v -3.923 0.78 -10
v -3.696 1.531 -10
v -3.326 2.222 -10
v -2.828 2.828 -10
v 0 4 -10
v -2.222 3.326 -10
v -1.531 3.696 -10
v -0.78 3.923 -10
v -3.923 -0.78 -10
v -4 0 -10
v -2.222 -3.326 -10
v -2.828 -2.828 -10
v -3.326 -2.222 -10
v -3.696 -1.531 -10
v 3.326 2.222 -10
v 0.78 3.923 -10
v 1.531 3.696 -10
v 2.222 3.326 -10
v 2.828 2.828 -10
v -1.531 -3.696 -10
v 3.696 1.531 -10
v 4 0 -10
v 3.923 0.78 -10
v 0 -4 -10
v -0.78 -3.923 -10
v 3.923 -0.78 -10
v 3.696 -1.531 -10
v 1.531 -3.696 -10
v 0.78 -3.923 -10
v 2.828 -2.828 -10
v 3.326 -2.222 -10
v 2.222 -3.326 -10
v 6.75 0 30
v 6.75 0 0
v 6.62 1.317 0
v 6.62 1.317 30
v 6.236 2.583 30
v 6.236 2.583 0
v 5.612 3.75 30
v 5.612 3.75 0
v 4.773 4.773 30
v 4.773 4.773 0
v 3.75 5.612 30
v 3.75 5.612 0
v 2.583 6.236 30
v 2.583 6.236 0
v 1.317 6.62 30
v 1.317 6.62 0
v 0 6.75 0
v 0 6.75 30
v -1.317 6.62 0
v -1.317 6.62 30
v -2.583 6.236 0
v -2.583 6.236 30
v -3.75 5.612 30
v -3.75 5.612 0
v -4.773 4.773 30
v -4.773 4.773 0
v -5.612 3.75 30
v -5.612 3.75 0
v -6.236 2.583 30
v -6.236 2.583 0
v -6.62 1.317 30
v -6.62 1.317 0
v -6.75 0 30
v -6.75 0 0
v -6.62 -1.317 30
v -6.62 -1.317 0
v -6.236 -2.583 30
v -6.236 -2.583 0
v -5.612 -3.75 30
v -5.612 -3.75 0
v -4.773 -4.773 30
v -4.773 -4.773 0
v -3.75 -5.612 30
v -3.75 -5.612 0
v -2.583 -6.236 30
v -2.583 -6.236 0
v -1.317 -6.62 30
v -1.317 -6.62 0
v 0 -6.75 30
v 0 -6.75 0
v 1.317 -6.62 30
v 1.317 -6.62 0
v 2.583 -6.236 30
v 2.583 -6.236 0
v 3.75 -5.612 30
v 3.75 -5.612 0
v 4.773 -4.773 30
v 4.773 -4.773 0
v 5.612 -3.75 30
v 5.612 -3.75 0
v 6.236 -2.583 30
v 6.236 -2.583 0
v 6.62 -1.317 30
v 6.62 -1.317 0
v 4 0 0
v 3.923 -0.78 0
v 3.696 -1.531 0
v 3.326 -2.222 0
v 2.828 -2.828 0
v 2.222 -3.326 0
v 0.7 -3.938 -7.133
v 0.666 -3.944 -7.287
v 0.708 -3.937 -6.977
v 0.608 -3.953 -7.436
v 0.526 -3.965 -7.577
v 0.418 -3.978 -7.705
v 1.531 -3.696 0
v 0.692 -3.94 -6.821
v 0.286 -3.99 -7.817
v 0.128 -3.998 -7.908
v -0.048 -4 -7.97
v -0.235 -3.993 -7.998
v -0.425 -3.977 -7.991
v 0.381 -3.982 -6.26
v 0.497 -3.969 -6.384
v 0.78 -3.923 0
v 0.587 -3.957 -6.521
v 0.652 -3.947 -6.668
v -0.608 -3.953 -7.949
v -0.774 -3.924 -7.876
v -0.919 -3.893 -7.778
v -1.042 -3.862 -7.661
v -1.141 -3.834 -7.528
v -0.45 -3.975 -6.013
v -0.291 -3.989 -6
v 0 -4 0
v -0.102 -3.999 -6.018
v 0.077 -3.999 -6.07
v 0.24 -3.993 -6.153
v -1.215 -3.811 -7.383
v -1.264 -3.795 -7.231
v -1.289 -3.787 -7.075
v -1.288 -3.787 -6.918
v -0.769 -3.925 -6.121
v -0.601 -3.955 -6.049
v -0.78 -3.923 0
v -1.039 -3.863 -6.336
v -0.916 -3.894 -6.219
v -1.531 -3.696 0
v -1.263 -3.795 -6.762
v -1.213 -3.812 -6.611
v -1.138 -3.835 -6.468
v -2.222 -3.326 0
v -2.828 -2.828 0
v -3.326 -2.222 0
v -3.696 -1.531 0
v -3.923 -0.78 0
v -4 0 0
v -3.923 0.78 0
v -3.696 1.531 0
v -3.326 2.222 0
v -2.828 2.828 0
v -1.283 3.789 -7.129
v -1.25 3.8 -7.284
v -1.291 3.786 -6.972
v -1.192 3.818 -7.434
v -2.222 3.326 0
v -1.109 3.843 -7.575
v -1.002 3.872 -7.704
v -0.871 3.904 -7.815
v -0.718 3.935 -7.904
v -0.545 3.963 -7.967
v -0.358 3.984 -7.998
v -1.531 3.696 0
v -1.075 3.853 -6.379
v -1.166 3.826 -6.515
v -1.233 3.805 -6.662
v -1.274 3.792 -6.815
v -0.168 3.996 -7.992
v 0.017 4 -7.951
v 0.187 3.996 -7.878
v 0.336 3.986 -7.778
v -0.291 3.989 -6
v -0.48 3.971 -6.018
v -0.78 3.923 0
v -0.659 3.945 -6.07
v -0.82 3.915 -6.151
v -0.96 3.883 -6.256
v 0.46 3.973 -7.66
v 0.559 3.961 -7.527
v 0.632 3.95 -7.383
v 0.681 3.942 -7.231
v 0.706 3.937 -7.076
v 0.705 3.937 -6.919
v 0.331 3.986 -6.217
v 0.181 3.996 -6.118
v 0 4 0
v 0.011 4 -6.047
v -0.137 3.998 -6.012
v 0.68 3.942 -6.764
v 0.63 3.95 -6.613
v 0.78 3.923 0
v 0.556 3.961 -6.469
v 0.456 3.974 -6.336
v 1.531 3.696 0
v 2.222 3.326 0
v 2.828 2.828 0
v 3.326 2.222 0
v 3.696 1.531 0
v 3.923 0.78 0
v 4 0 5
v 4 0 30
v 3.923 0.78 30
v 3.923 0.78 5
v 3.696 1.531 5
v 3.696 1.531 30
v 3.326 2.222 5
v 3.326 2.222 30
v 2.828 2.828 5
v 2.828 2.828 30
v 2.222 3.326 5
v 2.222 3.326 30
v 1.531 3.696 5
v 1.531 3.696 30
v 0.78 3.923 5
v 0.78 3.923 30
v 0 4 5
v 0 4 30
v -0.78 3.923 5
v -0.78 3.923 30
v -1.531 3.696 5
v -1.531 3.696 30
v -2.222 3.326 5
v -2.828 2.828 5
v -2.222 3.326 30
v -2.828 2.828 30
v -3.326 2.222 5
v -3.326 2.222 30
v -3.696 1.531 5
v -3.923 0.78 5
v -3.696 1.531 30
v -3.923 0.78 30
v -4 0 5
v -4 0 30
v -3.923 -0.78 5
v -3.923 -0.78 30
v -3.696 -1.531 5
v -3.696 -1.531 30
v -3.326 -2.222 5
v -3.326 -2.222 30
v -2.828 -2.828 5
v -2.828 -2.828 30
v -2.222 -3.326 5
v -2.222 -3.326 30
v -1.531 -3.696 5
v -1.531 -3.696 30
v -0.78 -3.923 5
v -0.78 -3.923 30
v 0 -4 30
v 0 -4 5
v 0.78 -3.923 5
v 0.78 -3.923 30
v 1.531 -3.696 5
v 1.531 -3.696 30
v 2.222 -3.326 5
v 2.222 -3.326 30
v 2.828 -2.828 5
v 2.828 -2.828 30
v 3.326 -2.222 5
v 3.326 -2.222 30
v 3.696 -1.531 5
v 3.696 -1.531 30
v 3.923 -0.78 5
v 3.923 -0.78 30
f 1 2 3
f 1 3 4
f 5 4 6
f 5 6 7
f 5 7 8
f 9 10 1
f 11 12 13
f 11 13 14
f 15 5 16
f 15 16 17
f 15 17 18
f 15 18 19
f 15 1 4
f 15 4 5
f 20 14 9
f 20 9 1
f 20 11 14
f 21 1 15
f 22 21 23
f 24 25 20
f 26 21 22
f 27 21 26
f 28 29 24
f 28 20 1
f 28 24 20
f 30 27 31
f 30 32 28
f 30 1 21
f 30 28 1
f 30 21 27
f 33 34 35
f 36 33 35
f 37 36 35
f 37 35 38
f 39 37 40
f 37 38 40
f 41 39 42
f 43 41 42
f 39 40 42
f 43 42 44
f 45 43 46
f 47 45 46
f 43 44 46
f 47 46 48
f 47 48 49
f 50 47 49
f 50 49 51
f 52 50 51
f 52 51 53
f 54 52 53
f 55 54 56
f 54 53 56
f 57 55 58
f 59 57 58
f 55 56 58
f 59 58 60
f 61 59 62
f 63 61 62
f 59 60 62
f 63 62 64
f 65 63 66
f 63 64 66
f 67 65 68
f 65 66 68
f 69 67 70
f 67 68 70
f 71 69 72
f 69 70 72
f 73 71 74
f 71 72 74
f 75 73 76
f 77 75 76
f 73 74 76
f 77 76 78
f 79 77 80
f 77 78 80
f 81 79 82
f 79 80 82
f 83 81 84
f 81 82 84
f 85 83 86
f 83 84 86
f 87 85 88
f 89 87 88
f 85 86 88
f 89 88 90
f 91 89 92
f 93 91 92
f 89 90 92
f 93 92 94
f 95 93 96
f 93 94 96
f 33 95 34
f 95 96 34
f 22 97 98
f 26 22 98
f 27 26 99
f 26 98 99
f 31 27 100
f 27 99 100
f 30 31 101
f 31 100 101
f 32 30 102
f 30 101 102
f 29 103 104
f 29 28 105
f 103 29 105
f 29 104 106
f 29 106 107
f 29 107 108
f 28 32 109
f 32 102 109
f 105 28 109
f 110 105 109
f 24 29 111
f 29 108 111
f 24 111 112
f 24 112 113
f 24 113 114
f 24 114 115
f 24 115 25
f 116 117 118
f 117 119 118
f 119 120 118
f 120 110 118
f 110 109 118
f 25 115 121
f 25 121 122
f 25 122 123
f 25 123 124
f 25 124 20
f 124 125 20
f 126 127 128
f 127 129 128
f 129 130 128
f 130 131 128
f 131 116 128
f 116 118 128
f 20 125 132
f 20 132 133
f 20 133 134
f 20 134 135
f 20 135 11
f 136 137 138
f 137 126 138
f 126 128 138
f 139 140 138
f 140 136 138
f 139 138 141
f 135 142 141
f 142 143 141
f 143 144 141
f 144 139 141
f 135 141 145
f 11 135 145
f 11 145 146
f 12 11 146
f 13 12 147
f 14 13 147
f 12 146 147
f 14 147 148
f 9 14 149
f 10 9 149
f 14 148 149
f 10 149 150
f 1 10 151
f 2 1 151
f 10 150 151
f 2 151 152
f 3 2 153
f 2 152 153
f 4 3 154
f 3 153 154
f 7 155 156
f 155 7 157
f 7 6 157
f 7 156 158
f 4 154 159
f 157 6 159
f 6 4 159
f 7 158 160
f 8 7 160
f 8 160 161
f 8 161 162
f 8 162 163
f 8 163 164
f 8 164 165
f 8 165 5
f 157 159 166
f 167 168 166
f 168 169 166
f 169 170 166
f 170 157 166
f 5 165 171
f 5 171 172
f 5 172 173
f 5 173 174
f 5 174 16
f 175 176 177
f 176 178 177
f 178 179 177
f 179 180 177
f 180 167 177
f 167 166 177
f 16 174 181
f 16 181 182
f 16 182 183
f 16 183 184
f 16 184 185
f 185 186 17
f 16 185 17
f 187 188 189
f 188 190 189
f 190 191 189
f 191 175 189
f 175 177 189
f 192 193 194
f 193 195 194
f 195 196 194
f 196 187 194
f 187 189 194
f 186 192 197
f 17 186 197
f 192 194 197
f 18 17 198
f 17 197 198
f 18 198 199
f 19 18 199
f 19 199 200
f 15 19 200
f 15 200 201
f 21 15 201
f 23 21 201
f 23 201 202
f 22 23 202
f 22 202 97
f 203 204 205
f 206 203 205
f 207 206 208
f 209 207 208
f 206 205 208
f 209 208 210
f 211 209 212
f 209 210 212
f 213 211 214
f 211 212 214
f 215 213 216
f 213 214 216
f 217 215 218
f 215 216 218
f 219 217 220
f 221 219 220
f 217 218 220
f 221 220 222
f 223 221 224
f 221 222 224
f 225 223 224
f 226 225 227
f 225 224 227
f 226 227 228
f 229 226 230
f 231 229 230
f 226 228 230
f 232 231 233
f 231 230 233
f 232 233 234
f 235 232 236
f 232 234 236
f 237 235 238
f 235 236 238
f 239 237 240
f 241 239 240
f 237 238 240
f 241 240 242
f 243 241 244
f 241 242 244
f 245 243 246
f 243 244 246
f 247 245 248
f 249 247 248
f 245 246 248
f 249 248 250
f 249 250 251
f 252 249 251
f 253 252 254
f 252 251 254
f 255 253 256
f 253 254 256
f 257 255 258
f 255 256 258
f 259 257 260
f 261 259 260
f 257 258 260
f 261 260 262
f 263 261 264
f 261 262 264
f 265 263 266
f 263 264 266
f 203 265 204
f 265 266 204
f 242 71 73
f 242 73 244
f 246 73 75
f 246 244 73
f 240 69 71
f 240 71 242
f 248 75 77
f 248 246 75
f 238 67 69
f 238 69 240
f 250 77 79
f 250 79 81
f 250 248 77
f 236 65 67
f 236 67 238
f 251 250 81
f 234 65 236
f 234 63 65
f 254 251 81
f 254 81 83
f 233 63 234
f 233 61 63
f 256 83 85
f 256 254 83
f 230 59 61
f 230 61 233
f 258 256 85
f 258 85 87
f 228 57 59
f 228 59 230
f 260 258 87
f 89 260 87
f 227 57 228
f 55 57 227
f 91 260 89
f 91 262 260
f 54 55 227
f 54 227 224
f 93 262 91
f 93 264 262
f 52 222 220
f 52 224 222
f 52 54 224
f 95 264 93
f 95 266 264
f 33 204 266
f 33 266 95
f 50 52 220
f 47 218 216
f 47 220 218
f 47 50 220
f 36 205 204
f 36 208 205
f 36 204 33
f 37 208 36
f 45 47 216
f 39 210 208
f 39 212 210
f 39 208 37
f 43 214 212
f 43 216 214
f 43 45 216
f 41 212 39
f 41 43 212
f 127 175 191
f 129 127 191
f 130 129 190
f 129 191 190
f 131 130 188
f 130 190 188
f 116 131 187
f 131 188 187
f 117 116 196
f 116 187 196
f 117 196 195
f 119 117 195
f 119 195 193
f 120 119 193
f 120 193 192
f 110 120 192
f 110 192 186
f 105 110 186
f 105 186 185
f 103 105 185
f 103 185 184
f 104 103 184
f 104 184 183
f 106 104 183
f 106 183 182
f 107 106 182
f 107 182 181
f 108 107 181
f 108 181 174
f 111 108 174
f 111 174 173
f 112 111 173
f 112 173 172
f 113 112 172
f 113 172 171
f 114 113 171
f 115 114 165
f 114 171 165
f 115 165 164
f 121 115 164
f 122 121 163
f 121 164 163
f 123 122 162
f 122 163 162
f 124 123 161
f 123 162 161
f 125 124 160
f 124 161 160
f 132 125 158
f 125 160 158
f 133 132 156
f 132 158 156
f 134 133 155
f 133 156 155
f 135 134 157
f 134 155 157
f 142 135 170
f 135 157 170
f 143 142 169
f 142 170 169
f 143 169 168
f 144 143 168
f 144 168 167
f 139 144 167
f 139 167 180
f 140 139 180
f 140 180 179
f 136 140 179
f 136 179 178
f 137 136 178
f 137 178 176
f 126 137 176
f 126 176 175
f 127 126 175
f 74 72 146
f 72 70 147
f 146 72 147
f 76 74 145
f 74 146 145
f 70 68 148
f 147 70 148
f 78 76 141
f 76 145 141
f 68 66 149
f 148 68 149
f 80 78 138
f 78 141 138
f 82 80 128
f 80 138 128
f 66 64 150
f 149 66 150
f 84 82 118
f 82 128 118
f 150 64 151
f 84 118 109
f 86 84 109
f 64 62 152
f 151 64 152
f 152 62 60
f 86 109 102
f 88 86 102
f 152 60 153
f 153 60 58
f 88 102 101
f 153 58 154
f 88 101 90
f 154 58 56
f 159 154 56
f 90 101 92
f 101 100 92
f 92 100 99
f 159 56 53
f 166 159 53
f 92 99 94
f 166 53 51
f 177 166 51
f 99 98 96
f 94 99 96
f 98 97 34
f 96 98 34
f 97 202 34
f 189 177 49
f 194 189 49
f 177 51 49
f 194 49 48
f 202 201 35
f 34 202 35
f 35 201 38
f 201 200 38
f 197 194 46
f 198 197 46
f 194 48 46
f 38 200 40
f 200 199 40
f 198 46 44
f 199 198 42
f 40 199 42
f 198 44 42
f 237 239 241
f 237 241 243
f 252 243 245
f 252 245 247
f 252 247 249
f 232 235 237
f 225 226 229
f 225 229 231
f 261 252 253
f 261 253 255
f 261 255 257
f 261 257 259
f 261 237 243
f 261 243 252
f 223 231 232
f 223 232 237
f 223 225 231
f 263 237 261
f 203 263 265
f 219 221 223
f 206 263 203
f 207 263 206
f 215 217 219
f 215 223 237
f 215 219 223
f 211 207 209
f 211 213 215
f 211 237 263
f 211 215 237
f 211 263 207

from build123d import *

# Parameters (mm, degrees)
SKETCH1_R           = 6.75
BOSS_EXTRUDE1_DEPTH = 30
SKETCH3_R           = 4
BOSS_EXTRUDE4_DEPTH = 10
SKETCH4_R           = 1
CUT_EXTRUDE2_DEPTH  = 15
SKETCH2_R           = 4
CUT_EXTRUDE3_DEPTH  = 25


with BuildPart() as part:
    # Sketch1 → Boss-Extrude1 (new body)
    with BuildSketch(Plane.XY):
        Circle(SKETCH1_R)
    extrude(amount=BOSS_EXTRUDE1_DEPTH)

    # Sketch3 → Boss-Extrude4 (add)
    with BuildSketch(Plane(origin=(0, 0, 0), x_dir=(-1, 0, 0), z_dir=(0, 0, -1))):
        with Locations(Location((0, 0, 0), (0, 0, 180))):
            Circle(SKETCH3_R)
    extrude(amount=BOSS_EXTRUDE4_DEPTH)

    # Sketch4 → Cut-Extrude2 (cut)
    with BuildSketch(Plane(origin=(0, 4, 0), x_dir=(1, 0, 0), z_dir=(0, 1, 0))):
        with Locations(Location((-0.291407977, 7, 0), (0, 0, 270))):
            Circle(SKETCH4_R)
    extrude(amount=-CUT_EXTRUDE2_DEPTH, mode=Mode.SUBTRACT)

    # Sketch2 → Cut-Extrude3 (cut)
    with BuildSketch(Plane.XY.offset(30)):
        Circle(SKETCH2_R)
    extrude(amount=-CUT_EXTRUDE3_DEPTH, mode=Mode.SUBTRACT)


solid = part.part
